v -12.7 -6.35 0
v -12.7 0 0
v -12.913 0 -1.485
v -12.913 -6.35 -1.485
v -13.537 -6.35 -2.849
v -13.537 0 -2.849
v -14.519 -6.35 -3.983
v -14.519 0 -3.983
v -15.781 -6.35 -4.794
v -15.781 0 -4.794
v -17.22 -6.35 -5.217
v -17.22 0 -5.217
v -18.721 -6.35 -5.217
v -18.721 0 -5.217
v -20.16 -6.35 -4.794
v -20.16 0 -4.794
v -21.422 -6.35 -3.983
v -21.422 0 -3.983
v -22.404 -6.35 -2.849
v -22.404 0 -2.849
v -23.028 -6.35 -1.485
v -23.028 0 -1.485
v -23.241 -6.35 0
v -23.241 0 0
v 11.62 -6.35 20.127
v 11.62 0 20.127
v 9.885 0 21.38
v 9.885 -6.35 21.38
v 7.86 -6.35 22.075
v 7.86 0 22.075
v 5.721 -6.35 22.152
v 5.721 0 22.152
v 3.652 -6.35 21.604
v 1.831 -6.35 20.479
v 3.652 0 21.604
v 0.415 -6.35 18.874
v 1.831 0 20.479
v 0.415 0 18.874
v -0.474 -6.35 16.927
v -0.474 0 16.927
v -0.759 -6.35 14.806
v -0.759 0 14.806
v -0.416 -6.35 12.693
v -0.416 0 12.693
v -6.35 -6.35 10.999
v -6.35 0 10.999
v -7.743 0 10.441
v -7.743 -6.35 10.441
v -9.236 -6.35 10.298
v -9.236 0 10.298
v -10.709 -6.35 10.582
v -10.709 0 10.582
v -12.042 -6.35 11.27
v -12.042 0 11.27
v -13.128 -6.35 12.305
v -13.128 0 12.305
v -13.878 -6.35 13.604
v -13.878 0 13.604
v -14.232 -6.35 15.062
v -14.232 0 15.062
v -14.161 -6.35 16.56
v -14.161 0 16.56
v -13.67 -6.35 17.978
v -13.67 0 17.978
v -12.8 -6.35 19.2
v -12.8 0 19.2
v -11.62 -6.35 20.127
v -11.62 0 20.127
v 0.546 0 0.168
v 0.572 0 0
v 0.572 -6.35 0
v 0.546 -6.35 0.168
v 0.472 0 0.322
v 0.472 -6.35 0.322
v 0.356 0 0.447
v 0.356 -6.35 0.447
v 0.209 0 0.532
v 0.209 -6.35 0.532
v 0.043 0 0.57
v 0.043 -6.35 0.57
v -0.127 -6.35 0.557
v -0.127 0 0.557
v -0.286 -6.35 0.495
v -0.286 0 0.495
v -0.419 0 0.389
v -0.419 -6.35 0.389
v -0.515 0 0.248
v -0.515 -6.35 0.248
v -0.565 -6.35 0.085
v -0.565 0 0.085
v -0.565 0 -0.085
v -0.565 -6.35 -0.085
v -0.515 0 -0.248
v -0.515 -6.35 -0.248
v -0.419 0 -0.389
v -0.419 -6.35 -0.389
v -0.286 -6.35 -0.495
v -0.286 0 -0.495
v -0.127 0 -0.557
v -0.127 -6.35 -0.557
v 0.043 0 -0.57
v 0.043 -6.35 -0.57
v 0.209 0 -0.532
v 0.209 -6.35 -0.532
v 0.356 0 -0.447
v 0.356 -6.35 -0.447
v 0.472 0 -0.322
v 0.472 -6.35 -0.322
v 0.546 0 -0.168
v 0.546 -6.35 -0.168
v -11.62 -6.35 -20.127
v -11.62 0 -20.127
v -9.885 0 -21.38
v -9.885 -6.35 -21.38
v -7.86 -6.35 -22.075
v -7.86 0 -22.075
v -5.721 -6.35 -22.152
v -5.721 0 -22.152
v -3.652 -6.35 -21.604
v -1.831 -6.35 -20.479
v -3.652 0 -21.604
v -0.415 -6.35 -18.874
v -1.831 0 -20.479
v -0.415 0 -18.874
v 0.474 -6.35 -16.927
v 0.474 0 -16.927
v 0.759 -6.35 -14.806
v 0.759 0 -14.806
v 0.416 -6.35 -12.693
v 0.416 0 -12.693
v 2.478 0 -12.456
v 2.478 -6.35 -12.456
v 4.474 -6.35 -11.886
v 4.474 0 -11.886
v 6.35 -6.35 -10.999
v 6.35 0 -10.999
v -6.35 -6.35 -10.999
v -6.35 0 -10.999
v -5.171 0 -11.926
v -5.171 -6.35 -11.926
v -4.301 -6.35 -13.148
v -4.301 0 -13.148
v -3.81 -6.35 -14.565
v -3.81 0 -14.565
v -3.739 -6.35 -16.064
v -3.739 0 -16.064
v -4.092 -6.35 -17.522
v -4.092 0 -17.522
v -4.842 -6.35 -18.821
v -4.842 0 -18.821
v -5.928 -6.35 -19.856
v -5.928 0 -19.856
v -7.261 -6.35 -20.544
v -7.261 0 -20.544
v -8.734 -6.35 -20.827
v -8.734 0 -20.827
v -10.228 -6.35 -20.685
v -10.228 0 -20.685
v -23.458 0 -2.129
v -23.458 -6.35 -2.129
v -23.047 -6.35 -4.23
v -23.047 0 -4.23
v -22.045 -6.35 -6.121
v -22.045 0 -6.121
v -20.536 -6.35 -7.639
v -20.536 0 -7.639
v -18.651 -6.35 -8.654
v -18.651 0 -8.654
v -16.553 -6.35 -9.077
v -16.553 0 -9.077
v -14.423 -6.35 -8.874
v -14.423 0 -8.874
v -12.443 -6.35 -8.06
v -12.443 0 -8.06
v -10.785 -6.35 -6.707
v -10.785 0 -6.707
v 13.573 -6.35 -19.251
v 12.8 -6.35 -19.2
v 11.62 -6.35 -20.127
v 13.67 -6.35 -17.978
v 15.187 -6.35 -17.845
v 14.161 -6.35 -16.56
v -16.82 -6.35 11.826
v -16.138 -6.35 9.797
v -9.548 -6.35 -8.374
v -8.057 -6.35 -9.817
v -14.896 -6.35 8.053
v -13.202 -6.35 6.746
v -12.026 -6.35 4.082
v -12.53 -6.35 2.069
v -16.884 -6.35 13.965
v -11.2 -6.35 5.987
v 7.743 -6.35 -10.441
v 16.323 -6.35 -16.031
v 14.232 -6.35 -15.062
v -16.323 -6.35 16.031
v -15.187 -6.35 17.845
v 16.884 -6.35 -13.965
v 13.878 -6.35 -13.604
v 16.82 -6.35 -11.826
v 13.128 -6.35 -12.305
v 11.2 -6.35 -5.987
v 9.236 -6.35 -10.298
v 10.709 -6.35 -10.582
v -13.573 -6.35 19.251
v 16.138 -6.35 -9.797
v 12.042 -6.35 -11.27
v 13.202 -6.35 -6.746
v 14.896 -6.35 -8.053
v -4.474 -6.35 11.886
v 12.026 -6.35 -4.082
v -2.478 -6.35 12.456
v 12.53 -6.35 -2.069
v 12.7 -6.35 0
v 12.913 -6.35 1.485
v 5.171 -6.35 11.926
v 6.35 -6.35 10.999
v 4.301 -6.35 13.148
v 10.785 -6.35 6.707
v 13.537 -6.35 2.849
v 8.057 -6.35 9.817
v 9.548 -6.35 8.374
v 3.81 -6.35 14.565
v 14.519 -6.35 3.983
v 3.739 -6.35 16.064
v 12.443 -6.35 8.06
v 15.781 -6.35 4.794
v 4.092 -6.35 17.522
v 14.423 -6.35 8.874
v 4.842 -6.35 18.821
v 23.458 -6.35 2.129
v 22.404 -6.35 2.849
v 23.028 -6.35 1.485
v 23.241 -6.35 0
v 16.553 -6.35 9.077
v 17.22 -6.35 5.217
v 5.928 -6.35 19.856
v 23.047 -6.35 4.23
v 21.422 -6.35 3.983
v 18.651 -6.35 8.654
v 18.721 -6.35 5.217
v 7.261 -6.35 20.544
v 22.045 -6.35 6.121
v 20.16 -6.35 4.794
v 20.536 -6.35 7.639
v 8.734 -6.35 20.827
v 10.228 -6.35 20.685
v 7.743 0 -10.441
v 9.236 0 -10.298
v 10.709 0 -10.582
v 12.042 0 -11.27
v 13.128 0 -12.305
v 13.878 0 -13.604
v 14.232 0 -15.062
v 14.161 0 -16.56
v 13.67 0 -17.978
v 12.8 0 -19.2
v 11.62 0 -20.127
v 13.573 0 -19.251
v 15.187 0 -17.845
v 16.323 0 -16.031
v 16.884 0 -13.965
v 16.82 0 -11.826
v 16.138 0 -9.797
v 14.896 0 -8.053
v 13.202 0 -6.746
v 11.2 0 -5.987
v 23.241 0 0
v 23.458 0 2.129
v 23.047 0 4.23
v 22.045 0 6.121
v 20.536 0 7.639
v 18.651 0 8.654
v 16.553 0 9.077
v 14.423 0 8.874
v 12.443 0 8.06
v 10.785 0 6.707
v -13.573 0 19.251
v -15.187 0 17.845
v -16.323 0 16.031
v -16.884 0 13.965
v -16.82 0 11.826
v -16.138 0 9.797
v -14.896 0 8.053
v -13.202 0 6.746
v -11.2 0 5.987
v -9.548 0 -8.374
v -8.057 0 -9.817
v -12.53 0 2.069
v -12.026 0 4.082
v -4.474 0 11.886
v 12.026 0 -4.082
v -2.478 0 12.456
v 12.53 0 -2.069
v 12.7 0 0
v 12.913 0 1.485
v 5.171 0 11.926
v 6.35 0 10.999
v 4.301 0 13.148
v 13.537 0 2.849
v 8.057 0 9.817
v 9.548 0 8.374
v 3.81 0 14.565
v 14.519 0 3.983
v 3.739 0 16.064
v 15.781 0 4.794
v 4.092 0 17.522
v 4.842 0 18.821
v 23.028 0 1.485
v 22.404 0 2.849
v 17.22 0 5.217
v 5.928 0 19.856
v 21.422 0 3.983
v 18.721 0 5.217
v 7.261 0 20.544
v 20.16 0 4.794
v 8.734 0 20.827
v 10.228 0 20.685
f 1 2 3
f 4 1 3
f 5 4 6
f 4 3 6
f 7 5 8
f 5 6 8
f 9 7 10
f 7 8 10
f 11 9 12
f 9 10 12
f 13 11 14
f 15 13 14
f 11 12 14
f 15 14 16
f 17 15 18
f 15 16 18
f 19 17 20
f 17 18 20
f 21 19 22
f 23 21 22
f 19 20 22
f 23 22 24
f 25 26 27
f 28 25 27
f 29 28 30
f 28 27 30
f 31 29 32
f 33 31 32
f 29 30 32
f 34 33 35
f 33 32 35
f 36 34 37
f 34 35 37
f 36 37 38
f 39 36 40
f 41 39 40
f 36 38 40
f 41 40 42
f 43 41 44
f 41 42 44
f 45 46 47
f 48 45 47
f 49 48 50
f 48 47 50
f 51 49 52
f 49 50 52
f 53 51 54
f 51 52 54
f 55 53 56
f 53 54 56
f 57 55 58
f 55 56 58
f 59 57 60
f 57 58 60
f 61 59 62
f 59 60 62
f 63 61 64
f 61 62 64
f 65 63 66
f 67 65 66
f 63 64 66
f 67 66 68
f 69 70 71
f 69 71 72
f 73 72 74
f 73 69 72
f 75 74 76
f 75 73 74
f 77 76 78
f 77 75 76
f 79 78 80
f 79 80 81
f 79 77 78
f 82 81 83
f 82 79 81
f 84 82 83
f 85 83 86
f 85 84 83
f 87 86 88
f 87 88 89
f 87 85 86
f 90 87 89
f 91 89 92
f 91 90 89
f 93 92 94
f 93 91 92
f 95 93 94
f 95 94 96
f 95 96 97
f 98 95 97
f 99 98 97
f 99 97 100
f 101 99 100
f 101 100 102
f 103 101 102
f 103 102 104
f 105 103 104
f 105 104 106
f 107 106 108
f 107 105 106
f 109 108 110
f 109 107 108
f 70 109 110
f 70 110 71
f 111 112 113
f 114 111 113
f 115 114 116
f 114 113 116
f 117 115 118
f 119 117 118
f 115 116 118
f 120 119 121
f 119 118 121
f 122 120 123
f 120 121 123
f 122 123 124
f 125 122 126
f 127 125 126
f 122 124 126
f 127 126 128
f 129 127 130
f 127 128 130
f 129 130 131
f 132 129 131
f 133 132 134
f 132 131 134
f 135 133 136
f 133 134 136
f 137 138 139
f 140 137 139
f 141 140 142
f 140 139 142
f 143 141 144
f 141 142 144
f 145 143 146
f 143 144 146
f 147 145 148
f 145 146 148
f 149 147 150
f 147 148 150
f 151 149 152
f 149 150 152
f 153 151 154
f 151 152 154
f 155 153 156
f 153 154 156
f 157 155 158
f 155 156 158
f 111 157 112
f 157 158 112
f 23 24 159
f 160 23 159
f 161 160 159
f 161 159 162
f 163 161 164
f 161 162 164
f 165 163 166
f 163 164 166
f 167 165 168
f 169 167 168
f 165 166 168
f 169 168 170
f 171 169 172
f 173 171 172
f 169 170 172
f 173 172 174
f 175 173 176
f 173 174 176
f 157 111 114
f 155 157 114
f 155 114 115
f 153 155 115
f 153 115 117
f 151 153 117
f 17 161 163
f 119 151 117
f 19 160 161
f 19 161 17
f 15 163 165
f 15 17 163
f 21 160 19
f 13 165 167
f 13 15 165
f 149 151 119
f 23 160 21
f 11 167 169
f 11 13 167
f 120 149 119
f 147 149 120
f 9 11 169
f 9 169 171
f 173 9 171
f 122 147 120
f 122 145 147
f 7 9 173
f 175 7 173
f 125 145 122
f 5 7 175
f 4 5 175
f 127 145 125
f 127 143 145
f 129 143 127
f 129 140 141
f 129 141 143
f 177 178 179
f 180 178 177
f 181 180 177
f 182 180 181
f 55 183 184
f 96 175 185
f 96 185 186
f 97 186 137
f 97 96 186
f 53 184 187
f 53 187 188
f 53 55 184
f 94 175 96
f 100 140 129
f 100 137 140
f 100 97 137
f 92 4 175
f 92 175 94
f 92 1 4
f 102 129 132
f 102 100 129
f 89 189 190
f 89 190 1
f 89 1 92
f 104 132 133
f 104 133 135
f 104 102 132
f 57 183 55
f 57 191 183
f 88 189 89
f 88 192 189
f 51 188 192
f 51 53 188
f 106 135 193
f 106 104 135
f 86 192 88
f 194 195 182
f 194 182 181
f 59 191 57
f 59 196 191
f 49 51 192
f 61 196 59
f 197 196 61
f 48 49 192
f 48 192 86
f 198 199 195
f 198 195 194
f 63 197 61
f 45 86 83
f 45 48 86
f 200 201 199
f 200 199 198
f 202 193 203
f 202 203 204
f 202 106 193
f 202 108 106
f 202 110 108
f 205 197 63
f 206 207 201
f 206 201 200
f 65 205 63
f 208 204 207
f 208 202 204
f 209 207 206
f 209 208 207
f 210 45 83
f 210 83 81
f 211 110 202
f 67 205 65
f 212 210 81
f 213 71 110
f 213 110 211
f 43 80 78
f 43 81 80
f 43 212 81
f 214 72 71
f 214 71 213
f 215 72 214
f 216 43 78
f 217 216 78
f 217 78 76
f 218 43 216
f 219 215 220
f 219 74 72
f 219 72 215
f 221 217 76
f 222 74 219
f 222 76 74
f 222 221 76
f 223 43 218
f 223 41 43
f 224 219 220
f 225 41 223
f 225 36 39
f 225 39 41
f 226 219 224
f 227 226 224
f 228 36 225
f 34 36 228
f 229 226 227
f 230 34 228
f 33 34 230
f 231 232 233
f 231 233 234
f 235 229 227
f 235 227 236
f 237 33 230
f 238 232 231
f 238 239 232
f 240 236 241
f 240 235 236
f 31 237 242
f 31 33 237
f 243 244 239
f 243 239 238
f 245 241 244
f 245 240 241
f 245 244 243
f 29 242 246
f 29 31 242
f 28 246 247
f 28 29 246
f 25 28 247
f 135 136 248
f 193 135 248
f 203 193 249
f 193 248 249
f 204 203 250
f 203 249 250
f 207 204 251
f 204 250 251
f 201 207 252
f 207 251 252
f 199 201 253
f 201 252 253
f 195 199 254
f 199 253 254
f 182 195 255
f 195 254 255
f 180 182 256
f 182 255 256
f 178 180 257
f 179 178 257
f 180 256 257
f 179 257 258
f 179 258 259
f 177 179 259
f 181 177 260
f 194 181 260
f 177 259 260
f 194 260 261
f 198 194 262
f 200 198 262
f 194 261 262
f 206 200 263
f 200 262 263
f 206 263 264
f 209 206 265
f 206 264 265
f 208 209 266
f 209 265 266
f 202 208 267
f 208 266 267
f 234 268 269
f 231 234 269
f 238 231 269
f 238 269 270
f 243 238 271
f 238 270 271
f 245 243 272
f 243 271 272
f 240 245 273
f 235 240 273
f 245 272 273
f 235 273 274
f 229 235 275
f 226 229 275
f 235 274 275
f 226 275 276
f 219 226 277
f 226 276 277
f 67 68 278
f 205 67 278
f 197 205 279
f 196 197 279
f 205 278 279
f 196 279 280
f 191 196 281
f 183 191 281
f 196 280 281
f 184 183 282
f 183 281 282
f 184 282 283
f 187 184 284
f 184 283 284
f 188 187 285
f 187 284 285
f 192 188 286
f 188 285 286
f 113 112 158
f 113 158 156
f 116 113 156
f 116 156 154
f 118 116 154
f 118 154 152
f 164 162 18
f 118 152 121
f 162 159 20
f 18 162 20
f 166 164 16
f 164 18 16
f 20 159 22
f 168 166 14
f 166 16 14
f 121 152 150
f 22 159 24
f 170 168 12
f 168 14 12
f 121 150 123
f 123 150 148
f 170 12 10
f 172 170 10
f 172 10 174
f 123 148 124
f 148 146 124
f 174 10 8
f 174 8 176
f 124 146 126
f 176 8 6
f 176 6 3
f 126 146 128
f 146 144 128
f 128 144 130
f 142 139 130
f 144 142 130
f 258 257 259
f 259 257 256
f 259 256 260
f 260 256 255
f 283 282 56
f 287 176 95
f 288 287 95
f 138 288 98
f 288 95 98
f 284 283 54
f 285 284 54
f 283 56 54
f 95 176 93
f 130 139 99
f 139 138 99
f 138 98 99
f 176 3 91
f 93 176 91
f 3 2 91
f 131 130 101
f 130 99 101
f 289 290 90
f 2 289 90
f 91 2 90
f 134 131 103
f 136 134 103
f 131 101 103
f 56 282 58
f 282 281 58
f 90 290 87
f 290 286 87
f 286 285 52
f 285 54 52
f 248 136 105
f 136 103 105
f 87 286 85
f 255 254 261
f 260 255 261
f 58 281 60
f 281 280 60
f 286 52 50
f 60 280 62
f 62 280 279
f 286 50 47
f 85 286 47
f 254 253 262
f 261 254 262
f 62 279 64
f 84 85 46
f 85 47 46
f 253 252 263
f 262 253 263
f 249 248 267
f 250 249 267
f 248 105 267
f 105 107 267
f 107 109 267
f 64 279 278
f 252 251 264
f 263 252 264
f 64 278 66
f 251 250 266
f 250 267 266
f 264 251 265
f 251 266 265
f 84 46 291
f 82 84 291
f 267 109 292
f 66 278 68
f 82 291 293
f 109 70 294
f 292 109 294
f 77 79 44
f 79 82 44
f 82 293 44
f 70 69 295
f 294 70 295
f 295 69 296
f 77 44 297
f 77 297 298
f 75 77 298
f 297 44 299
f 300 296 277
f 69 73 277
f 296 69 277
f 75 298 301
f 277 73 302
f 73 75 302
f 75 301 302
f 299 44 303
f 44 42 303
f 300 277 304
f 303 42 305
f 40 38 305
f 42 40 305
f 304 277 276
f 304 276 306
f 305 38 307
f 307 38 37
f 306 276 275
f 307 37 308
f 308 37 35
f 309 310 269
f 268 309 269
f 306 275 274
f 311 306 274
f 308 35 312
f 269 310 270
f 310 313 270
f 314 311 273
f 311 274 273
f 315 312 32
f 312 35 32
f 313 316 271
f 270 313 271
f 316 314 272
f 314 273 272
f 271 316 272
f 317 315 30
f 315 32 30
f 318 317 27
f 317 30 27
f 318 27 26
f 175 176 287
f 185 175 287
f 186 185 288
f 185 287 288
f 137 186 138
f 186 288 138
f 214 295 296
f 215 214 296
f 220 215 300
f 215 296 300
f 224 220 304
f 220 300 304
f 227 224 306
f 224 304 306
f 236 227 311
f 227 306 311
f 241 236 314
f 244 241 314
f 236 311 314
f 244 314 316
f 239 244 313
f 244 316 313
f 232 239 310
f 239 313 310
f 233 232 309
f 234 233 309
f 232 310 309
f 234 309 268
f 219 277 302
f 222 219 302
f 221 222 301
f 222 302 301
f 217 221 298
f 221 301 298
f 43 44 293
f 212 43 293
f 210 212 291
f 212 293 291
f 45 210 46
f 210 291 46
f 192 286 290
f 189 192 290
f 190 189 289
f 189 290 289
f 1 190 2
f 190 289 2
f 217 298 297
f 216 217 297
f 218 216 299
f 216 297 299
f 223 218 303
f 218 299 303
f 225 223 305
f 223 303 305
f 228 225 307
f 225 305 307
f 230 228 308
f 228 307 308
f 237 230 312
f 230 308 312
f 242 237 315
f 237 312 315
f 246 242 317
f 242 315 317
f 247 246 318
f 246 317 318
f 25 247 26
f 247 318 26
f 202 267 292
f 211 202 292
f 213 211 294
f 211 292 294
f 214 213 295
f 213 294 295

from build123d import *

# Parameters (mm, degrees)
F0_R     = 0.5715
F1_DEPTH = 6.35


with BuildPart() as f1:
    # F0 (on Front) → F1 (new body)
    with BuildSketch(Plane.XZ):
        with BuildLine():
            ThreePointArc((23.241, 0), (19.630978, 8.215892), (10.784784, 6.706597))
            ThreePointArc((10.784784, 6.706597), (8.832064, 9.126042), (6.35, 10.998523))
            ThreePointArc((6.35, 10.998523), (4.420863, 18.19816), (11.6205, 20.127296))
            ThreePointArc((11.6205, 20.127296), (2.700318, 21.108872), (-0.415691, 12.693195))
            ThreePointArc((-0.415691, 12.693195), (-3.487352, 12.211813), (-6.35, 10.998523))
            ThreePointArc((-6.35, 10.998523), (-13.549637, 12.92766), (-11.6205, 20.127296))
            ThreePointArc((-11.6205, 20.127296), (-16.93066, 12.89298), (-11.200475, 5.986598))
            ThreePointArc((-11.200475, 5.986598), (-12.319416, 3.085771), (-12.7, 0))
            ThreePointArc((-12.7, 0), (-17.9705, -5.2705), (-23.241, 0))
            ThreePointArc((-23.241, 0), (-19.630978, -8.215892), (-10.784784, -6.706597))
            ThreePointArc((-10.784784, -6.706597), (-8.832064, -9.126042), (-6.35, -10.998523))
            ThreePointArc((-6.35, -10.998523), (-4.420863, -18.19816), (-11.6205, -20.127296))
            ThreePointArc((-11.6205, -20.127296), (-2.700318, -21.108872), (0.415691, -12.693195))
            ThreePointArc((0.415691, -12.693195), (3.487352, -12.211813), (6.35, -10.998523))
            ThreePointArc((6.35, -10.998523), (13.549637, -12.92766), (11.6205, -20.127296))
            ThreePointArc((11.6205, -20.127296), (16.93066, -12.89298), (11.200475, -5.986598))
            ThreePointArc((11.200475, -5.986598), (12.319416, -3.085771), (12.7, 0))
            ThreePointArc((12.7, 0), (17.9705, 5.2705), (23.241, 0))
        make_face()
        Circle(F0_R, mode=Mode.SUBTRACT)
    extrude(amount=F1_DEPTH)


solid = f1.part
